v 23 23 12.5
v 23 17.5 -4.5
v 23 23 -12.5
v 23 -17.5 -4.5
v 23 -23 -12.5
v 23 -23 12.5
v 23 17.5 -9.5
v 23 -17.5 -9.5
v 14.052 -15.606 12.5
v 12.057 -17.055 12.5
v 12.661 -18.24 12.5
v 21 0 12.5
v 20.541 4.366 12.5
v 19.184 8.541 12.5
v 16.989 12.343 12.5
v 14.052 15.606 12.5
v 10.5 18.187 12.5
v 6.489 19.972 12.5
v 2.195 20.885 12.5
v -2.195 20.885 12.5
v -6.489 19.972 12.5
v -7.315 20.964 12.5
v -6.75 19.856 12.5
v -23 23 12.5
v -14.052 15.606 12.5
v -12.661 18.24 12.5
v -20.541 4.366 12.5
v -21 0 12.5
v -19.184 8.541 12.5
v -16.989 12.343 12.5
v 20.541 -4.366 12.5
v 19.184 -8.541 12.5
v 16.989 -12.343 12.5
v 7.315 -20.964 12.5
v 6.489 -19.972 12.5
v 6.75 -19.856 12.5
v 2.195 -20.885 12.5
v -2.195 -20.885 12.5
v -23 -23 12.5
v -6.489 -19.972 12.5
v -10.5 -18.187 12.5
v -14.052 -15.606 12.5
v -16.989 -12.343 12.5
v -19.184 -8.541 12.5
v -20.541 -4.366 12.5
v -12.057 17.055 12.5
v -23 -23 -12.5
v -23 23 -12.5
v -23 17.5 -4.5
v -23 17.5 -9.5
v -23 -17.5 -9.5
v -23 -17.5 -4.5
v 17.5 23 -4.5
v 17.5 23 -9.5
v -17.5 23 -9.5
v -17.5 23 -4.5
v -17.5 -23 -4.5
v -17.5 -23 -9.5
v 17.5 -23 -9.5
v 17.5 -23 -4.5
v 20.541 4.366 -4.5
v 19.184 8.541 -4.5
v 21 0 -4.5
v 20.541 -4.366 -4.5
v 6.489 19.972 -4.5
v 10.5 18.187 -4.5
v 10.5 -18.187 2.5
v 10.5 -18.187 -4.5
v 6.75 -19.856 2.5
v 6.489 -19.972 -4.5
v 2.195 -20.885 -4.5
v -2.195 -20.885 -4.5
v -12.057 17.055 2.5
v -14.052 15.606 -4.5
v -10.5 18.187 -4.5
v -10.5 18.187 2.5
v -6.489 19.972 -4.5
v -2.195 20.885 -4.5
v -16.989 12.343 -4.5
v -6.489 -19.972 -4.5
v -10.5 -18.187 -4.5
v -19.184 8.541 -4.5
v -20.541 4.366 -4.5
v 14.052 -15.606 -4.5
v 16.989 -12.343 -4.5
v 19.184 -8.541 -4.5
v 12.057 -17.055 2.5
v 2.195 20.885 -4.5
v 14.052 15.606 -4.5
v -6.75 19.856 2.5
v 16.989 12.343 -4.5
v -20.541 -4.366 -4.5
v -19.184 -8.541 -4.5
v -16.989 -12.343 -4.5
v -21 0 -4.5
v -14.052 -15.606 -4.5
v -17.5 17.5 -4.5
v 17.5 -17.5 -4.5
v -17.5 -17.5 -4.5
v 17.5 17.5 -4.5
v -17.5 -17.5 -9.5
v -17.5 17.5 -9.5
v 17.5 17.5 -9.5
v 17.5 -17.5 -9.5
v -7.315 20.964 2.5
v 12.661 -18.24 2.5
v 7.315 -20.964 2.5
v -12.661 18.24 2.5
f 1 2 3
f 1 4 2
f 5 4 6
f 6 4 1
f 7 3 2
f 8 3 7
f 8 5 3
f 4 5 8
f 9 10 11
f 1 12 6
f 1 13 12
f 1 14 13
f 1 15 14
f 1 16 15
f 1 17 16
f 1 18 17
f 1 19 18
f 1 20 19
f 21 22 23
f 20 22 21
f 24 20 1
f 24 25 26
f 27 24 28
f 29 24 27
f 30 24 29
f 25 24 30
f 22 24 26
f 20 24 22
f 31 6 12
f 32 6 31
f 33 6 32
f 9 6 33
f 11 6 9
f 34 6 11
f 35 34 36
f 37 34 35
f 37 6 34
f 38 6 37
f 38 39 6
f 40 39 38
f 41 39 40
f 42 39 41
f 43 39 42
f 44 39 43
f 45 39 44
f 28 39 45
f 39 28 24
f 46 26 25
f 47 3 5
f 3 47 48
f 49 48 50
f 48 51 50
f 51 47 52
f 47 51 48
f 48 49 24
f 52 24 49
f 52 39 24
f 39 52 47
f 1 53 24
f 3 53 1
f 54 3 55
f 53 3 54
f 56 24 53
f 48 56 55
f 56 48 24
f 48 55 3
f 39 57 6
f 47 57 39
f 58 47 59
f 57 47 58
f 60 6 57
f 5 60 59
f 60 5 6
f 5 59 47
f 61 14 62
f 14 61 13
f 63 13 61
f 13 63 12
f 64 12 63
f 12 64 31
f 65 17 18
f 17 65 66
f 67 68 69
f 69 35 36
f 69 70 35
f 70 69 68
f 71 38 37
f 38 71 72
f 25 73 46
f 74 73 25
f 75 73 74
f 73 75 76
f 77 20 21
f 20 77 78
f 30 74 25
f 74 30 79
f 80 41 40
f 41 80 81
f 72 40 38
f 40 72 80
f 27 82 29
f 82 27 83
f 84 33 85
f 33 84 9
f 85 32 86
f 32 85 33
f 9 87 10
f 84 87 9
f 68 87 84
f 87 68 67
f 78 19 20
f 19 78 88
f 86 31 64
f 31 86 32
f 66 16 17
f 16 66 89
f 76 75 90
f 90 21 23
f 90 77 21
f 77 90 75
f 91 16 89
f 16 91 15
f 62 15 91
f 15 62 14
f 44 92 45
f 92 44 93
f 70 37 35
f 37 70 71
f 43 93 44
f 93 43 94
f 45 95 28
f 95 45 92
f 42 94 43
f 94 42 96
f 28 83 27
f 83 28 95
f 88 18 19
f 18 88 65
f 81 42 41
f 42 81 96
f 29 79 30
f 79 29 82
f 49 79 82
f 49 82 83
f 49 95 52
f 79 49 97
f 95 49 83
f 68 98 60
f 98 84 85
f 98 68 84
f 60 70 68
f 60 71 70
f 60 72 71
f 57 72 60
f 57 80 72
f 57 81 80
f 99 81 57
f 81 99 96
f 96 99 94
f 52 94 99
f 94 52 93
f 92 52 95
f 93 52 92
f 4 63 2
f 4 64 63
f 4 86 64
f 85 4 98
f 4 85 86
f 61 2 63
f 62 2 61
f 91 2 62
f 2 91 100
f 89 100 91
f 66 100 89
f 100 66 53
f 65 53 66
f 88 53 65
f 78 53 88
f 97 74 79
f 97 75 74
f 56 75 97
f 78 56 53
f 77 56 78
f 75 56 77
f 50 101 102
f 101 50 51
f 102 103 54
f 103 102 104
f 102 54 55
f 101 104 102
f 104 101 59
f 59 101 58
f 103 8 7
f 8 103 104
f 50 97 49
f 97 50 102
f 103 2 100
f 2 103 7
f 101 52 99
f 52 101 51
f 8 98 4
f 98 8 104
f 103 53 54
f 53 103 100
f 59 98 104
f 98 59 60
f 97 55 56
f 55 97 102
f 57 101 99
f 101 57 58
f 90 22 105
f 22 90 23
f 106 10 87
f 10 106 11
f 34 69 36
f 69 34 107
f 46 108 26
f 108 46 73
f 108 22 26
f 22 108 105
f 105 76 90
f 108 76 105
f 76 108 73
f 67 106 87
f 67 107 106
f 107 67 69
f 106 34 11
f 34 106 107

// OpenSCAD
difference()
{
  cube([46,46,25],center=true);
  translate([0,0,-9]) cylinder(d=42,h=25);
  translate([0,0,-7]) cube([60,35,5],center=true);
  translate([0,0,-7]) cube([35,60,5],center=true);
  rotate([0,0,27]) translate([0,0,15]) cube([6,44,25],center=true);
}
